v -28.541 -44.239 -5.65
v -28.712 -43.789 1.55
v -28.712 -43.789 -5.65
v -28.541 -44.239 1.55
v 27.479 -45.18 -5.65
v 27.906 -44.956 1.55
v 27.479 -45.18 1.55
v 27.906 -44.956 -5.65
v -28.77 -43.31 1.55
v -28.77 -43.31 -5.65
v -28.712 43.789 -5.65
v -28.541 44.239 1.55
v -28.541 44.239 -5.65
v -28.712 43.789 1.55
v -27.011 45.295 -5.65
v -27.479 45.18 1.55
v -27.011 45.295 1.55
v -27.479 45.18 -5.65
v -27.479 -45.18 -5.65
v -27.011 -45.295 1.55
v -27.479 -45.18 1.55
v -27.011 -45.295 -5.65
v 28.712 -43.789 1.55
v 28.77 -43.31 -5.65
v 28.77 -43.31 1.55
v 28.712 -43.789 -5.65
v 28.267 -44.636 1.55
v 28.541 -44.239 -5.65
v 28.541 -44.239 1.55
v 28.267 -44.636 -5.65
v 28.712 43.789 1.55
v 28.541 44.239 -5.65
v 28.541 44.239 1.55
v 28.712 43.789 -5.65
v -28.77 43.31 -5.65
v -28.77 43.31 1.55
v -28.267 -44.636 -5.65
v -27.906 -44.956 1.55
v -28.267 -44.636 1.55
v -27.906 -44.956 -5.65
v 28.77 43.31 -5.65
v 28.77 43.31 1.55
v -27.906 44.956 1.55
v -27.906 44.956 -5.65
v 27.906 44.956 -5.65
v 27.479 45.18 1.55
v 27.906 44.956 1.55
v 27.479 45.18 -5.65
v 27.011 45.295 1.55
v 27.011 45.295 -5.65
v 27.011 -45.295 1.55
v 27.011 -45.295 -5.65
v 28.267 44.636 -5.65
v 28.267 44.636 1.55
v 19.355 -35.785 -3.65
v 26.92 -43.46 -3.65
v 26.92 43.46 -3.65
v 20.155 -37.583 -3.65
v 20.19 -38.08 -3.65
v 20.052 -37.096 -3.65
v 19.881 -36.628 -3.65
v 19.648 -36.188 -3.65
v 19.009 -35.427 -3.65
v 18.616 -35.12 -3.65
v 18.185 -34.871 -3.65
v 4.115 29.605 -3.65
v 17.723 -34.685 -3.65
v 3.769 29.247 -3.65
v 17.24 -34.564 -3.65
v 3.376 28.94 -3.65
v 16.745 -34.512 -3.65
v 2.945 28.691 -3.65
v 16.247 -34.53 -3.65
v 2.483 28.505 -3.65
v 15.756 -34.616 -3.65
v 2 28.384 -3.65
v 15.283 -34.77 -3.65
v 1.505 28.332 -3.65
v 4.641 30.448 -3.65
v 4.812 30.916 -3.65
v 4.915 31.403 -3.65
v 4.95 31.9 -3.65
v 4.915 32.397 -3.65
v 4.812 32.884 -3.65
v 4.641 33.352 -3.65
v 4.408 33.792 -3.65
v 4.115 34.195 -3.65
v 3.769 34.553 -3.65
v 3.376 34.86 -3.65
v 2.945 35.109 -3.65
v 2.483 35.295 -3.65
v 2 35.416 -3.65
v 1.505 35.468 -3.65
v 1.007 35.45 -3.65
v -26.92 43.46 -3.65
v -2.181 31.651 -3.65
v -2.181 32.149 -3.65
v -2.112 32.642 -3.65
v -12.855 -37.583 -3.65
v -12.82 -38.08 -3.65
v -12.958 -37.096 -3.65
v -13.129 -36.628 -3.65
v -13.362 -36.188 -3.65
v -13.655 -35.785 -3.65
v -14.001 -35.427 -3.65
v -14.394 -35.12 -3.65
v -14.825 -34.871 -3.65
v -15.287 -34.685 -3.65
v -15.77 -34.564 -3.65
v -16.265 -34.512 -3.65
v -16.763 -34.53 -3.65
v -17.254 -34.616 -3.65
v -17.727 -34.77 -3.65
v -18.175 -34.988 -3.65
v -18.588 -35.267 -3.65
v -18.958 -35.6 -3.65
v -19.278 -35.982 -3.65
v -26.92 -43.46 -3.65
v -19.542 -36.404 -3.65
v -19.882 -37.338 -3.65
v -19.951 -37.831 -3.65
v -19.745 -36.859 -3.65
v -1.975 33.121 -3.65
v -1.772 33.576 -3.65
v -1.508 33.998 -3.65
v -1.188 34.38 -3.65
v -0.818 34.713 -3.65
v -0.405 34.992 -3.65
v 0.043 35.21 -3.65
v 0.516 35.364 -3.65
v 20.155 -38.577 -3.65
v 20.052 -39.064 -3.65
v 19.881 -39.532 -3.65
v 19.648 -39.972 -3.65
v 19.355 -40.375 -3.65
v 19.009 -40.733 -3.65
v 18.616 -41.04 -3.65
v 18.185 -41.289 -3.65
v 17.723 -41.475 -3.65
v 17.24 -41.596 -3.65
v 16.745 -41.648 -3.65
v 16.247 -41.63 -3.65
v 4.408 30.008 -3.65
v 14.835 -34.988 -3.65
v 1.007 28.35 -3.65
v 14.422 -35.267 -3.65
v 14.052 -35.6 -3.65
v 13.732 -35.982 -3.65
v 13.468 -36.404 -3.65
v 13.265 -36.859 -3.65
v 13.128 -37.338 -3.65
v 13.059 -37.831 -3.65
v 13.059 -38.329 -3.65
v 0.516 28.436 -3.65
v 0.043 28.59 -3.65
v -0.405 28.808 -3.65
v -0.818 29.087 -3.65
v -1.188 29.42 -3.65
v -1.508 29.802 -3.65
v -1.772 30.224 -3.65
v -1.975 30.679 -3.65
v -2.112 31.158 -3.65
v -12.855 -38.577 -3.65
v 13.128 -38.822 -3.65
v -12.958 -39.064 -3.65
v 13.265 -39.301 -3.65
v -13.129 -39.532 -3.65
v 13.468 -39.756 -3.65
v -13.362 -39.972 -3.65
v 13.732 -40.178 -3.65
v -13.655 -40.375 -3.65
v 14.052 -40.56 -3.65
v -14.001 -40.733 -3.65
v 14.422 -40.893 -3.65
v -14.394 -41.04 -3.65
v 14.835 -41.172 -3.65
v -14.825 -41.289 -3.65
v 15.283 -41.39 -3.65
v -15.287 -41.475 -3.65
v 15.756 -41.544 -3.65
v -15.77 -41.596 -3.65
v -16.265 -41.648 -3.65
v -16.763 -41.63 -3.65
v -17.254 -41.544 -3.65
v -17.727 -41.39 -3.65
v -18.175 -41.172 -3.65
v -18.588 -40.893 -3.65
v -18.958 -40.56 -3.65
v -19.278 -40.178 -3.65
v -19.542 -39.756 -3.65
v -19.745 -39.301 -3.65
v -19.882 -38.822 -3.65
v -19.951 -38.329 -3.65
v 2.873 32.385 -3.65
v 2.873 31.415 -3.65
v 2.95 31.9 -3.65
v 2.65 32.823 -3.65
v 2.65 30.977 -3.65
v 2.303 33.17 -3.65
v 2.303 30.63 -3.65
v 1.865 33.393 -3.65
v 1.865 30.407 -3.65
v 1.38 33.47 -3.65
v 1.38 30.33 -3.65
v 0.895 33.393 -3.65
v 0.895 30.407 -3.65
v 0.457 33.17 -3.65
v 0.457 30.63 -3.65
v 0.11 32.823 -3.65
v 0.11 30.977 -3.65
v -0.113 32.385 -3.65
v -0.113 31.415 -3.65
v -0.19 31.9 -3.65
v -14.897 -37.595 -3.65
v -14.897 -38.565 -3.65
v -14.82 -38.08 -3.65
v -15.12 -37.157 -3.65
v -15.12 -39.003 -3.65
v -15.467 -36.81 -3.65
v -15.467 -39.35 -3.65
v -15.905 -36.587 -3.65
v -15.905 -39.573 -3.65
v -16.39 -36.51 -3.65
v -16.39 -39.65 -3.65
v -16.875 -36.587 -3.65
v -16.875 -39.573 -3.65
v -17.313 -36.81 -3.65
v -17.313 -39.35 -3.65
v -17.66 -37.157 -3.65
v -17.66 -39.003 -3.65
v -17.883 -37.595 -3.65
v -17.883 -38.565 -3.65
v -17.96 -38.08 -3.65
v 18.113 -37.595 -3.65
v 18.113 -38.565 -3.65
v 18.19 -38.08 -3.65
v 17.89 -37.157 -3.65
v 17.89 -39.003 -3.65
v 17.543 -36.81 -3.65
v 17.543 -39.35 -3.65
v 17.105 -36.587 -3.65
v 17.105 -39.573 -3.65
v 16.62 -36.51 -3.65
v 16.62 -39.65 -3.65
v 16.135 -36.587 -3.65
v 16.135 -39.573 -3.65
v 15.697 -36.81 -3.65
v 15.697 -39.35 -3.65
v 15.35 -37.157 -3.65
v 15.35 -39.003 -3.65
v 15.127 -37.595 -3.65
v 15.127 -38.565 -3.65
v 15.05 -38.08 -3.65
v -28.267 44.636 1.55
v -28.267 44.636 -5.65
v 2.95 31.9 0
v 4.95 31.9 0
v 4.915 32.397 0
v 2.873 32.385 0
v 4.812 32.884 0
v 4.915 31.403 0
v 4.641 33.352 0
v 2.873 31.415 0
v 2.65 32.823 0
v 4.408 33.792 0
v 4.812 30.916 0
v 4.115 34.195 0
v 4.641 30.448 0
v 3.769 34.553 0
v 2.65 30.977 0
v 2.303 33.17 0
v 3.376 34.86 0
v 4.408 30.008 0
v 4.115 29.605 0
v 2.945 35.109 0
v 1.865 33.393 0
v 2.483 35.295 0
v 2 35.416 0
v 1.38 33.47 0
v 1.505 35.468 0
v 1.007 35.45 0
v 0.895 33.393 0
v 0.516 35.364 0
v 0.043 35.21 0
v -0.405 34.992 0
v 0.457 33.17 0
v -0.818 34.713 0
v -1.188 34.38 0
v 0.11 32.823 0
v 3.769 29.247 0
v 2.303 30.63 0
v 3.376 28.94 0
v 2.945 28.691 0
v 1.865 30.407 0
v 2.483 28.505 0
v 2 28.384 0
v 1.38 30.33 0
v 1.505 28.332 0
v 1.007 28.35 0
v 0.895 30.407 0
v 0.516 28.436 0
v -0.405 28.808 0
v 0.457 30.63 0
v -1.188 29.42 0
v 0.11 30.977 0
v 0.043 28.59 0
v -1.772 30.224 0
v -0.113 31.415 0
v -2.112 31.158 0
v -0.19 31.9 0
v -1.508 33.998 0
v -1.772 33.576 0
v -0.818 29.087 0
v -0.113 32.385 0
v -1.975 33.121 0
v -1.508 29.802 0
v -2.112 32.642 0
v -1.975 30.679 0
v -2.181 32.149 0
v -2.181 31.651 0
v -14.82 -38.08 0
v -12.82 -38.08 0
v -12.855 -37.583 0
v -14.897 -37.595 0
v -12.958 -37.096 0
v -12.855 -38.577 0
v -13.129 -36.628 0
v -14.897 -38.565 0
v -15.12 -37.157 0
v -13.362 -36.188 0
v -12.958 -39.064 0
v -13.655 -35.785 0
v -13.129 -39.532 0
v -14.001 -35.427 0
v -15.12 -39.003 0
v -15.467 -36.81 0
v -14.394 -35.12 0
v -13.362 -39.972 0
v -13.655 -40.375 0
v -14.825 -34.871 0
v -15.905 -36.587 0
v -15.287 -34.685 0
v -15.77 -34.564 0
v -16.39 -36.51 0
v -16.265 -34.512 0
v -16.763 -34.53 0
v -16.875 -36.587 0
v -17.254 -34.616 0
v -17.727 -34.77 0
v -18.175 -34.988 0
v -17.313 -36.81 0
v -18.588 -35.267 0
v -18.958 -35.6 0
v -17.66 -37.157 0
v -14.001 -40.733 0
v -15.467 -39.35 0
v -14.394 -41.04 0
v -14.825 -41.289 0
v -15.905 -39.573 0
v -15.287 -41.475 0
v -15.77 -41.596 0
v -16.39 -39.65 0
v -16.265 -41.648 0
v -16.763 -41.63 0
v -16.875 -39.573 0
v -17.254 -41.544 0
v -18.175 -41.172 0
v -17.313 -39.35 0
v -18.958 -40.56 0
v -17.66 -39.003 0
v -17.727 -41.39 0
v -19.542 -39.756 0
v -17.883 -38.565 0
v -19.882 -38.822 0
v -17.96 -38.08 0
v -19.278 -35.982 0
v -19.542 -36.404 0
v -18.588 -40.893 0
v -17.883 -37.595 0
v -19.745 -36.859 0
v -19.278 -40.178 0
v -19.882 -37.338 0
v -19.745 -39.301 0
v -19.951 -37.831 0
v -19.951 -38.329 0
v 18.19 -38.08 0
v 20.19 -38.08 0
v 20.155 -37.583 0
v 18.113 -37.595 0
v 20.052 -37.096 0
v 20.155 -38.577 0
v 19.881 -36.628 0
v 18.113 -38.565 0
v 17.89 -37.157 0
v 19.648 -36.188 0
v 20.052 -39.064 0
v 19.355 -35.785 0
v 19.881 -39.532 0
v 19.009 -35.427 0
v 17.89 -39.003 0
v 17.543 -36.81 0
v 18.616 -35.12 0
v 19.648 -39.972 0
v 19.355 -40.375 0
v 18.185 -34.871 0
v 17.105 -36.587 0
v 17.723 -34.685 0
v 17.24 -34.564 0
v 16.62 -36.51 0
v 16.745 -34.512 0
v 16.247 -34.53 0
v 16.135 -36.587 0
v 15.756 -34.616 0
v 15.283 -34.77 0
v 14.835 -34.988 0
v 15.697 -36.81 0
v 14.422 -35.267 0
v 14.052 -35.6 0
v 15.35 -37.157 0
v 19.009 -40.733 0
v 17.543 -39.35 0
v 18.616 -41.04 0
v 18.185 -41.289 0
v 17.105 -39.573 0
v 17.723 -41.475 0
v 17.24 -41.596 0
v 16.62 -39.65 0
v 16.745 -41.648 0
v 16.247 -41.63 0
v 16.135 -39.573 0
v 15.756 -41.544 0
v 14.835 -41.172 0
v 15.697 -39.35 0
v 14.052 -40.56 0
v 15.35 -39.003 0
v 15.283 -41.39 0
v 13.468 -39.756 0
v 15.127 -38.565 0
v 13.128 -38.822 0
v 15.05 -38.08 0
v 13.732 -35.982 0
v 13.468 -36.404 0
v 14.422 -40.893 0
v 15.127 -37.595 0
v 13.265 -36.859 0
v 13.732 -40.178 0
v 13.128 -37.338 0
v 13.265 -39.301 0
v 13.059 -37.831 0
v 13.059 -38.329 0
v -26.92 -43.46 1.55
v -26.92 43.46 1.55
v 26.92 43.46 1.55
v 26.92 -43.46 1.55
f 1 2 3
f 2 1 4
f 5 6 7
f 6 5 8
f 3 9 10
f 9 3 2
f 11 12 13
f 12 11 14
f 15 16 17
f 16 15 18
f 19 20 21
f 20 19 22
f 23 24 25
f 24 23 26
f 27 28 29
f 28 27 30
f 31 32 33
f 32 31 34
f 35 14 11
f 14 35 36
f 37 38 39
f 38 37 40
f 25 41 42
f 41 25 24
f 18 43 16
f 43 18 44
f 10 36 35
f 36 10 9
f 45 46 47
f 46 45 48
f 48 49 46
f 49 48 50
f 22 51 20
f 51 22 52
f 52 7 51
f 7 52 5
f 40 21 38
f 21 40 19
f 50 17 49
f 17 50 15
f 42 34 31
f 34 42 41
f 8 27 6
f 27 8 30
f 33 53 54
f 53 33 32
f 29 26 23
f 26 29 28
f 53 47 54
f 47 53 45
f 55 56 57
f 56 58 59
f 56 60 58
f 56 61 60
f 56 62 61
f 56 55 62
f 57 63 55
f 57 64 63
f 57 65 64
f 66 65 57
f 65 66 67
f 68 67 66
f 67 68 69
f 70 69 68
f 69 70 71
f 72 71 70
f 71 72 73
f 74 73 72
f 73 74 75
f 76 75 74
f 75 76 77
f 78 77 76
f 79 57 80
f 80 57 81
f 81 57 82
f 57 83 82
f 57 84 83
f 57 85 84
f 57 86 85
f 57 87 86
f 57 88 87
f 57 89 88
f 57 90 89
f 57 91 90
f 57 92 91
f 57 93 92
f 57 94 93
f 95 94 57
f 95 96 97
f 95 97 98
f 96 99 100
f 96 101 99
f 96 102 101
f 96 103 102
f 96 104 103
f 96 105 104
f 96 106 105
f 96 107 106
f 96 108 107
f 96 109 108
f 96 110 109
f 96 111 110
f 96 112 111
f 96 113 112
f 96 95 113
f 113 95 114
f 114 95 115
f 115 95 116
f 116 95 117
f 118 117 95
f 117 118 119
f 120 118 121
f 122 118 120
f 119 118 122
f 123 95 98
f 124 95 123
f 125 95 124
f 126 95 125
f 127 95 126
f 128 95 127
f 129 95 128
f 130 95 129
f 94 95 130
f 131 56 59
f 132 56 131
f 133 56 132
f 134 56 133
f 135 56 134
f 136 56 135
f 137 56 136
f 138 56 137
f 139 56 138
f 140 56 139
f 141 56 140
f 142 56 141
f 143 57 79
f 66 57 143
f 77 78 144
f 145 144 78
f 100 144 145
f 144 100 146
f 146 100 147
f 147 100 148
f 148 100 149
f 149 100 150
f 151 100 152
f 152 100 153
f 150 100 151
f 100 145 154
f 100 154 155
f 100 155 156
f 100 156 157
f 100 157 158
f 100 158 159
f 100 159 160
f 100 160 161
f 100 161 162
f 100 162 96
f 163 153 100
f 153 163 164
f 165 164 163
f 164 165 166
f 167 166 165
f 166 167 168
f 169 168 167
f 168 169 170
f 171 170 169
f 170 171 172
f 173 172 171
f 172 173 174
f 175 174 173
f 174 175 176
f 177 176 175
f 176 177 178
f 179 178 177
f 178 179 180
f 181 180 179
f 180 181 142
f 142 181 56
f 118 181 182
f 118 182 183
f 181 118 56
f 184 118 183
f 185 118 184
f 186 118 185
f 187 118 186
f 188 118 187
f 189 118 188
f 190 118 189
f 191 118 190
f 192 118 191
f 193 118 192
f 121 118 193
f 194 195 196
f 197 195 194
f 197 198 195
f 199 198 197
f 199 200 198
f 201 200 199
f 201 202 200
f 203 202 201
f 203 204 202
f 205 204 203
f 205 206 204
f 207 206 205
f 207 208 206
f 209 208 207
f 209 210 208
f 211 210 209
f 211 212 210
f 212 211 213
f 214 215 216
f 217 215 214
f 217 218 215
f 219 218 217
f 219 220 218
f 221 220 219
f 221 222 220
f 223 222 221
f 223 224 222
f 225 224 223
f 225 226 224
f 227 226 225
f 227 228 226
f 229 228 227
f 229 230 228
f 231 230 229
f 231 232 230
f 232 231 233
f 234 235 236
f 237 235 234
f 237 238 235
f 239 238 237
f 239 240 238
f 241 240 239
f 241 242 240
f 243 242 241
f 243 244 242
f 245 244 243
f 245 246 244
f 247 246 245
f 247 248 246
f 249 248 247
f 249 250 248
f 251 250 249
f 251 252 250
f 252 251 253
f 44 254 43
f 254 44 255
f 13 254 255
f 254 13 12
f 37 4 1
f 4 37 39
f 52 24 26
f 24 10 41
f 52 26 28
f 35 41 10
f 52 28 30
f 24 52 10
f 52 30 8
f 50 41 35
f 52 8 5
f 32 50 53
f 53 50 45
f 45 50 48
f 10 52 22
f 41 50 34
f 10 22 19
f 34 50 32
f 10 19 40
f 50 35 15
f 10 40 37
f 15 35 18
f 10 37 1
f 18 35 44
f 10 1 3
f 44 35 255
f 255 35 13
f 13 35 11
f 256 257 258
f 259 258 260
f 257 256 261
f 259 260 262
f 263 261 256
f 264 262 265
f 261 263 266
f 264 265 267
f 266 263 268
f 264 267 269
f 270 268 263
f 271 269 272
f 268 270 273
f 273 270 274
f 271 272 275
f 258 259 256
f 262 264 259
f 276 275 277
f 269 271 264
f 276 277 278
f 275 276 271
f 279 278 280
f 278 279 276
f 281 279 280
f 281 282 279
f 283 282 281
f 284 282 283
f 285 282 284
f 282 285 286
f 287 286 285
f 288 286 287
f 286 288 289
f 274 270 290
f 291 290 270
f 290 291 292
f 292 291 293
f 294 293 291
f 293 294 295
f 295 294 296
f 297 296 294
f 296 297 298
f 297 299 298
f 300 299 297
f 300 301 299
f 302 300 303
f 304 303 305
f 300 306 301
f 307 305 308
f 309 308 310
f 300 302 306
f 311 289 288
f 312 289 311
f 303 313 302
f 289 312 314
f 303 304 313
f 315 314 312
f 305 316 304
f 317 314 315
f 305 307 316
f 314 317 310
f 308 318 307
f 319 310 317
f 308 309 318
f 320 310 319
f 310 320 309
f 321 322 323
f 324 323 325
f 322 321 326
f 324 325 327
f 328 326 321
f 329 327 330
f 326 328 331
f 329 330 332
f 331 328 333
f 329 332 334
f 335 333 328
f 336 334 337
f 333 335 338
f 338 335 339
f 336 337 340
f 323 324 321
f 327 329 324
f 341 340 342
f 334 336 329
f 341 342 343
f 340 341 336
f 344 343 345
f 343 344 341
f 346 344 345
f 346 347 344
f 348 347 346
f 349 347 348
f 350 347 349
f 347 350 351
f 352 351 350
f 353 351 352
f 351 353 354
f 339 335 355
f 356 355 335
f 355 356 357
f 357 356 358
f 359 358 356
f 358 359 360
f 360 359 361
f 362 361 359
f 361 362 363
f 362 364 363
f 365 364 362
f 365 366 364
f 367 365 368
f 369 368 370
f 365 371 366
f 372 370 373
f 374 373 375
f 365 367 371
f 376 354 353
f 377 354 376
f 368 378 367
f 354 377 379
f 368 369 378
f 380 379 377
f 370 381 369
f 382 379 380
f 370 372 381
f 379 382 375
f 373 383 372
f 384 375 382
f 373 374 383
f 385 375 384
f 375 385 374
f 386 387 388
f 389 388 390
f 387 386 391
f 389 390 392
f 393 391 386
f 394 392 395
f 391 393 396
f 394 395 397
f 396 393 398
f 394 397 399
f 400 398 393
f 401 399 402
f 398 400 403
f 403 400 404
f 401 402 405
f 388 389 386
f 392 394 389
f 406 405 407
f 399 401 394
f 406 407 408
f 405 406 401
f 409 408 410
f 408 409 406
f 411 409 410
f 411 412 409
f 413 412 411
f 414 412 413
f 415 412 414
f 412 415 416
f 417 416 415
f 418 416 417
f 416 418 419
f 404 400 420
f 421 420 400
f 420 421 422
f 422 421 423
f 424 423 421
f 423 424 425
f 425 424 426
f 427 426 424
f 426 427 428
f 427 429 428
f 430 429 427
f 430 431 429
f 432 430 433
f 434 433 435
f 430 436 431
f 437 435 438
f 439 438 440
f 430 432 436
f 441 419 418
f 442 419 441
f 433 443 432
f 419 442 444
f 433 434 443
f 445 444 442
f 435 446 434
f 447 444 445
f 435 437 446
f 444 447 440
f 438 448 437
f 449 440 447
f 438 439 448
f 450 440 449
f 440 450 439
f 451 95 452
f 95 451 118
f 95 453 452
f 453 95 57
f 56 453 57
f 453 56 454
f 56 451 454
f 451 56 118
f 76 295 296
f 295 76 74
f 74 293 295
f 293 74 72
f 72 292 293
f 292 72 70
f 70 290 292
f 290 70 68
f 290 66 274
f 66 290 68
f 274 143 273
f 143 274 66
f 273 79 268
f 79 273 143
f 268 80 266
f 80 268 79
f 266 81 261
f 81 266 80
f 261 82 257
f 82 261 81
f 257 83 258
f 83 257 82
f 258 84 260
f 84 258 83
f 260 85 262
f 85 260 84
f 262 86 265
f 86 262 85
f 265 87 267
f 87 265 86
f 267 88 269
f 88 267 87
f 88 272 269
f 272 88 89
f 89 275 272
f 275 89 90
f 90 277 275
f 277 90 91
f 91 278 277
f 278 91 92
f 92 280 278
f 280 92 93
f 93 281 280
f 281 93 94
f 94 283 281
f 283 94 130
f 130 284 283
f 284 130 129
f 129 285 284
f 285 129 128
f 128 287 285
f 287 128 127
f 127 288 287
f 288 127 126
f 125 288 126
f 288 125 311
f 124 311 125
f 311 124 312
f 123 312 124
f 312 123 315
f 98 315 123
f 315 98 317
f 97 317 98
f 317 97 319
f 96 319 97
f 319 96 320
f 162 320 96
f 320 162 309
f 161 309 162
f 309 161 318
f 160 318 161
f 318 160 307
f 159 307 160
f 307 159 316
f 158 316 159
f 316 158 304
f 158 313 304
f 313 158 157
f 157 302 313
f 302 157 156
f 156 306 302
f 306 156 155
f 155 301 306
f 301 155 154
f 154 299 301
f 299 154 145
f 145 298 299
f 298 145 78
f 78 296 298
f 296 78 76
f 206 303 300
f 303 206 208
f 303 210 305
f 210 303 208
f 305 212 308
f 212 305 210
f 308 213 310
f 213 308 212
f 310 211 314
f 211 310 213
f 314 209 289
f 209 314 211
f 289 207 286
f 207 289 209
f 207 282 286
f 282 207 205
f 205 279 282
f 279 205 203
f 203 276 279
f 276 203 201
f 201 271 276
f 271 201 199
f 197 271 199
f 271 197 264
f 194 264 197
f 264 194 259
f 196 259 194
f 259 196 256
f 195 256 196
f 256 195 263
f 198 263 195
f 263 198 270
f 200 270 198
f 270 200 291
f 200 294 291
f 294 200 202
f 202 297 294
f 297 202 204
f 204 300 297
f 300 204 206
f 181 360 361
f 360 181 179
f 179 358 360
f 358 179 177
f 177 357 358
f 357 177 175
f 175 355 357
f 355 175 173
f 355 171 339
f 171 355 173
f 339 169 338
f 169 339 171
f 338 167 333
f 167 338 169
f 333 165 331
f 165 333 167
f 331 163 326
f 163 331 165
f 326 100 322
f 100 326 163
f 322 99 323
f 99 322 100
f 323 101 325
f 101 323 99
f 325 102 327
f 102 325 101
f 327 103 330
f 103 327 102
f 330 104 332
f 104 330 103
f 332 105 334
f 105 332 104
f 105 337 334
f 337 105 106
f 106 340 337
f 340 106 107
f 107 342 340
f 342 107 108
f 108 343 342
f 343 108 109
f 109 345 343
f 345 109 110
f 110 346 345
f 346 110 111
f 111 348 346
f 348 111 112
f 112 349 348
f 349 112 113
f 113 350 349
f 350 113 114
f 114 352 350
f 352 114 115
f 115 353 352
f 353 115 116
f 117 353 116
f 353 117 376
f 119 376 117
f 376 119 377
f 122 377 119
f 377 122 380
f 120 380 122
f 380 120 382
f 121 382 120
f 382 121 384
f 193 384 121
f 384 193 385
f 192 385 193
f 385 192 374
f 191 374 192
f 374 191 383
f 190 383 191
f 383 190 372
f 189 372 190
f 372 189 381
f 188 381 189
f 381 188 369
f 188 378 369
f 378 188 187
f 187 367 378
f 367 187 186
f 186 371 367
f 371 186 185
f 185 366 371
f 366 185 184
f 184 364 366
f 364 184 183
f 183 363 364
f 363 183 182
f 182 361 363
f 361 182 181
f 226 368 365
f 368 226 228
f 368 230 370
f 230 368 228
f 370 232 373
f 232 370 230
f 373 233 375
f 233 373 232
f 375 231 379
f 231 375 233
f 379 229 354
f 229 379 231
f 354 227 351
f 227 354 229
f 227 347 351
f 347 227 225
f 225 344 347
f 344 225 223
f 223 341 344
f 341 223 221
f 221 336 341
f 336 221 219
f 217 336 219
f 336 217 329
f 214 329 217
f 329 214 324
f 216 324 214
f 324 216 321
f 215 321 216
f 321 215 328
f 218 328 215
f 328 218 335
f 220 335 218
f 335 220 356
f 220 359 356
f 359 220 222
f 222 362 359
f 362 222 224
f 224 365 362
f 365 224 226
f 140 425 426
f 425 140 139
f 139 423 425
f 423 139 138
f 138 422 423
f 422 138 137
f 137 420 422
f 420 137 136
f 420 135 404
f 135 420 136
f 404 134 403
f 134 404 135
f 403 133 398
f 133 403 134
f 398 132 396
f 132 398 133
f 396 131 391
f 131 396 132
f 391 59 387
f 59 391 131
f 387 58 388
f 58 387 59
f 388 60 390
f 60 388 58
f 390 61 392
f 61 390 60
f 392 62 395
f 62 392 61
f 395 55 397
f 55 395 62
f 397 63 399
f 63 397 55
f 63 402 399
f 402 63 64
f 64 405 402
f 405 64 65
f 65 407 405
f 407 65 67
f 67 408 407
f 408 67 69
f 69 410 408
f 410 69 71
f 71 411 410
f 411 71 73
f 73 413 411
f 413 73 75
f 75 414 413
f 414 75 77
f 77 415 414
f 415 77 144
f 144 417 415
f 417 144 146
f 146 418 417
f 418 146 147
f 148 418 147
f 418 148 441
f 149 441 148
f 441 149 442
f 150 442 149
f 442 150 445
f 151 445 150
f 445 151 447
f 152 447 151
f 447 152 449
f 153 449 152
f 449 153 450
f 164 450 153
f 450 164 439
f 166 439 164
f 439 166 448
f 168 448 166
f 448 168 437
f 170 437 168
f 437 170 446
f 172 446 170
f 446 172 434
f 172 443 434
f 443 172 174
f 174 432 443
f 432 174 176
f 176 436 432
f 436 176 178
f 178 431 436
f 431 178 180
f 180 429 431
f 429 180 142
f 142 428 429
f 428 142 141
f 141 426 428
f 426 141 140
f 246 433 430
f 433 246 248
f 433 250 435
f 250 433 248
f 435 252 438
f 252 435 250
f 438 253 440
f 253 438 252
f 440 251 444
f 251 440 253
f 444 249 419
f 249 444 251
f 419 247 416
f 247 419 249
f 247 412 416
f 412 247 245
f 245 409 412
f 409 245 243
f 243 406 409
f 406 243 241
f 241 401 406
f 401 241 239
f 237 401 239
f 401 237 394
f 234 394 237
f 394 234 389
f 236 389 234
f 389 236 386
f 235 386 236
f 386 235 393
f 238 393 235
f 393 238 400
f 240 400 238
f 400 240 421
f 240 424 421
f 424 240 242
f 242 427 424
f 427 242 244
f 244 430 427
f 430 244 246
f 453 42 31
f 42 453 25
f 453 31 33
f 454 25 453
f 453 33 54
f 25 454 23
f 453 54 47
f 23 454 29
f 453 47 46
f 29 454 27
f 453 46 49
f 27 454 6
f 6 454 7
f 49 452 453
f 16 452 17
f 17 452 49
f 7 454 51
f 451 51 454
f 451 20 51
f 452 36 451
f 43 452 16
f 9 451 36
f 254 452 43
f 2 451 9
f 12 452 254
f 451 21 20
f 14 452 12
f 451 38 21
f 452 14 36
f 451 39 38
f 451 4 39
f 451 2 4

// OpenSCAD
$fs = 0.5; // This is the shortest that any such polygonal edge can be ( to avoid too many edges in small circles)
$fa = 360 / 180; // This is the maximum number of edges in a polygon ( to avoid too many edges in large circles)

// TODO: Support under the board so that it doesn't flex on its tripod, esp when pushing down in top left / top right

clearance = 0.15;

wall_thickness = 2;

pcb_size = [ 53.54, 86.62 ];
pcb_thickness = 1.55;
pcb_hole_radius = 3.14 / 2;
left_edge = - pcb_size[0] / 2;
far_edge = pcb_size[1] / 2;
near_edge = - far_edge;
pcb_hole_locations = [
  [ left_edge + 26.58 + pcb_hole_radius, far_edge - 9.84 - pcb_hole_radius ],
  [ left_edge +  8.81 + pcb_hole_radius, near_edge + 3.66 + pcb_hole_radius ],
  [ left_edge + 41.82 + pcb_hole_radius, near_edge + 3.66 + pcb_hole_radius ],
];
component_height_under_pcb = 3.65;


module at_locations( locations )
{
  for( location= locations )
    translate( location )
      child();
}


module at_corners( size )
{
  for( y= [ -1, +1 ])
    for( x= [ -1, +1 ])
      translate([ size[0] / 2 * x, size[1] / 2 * y ])
        child();
}


module board()
{
  color("green")
  linear_extrude( height= pcb_thickness )
  {
    difference()
    {
      square( pcb_size, center=true );
      //translate( -pcb_size/2 )
      at_locations( pcb_hole_locations )
        circle( r= pcb_hole_radius );
    }
  }
  %mirror([0,0,1])
  linear_extrude( height= component_height_under_pcb )
    square( pcb_size, center=true );
}


module base()
{
  support_wall_thickness = 2;

  module section( offset, height, hollow, supports )
  {
    translate([0,0, offset ])
    linear_extrude( height= height )
    {
      difference()
      {
        hull()
          at_corners( pcb_size )
            circle( r= wall_thickness );
        if ( hollow )
          square( pcb_size + [clearance,clearance]*2, center=true );
      }
      if ( supports )
        at_locations( pcb_hole_locations )
          difference()
          {
            circle( r= pcb_hole_radius + support_wall_thickness );
            circle( r= pcb_hole_radius );
          }
    }
  }

  mirror([0,0,1])
  {
    section( component_height_under_pcb, wall_thickness, false, false );
    section( 0, component_height_under_pcb, true, true );
  }
  section( 0, pcb_thickness, true, false );
}


%board();
base();
